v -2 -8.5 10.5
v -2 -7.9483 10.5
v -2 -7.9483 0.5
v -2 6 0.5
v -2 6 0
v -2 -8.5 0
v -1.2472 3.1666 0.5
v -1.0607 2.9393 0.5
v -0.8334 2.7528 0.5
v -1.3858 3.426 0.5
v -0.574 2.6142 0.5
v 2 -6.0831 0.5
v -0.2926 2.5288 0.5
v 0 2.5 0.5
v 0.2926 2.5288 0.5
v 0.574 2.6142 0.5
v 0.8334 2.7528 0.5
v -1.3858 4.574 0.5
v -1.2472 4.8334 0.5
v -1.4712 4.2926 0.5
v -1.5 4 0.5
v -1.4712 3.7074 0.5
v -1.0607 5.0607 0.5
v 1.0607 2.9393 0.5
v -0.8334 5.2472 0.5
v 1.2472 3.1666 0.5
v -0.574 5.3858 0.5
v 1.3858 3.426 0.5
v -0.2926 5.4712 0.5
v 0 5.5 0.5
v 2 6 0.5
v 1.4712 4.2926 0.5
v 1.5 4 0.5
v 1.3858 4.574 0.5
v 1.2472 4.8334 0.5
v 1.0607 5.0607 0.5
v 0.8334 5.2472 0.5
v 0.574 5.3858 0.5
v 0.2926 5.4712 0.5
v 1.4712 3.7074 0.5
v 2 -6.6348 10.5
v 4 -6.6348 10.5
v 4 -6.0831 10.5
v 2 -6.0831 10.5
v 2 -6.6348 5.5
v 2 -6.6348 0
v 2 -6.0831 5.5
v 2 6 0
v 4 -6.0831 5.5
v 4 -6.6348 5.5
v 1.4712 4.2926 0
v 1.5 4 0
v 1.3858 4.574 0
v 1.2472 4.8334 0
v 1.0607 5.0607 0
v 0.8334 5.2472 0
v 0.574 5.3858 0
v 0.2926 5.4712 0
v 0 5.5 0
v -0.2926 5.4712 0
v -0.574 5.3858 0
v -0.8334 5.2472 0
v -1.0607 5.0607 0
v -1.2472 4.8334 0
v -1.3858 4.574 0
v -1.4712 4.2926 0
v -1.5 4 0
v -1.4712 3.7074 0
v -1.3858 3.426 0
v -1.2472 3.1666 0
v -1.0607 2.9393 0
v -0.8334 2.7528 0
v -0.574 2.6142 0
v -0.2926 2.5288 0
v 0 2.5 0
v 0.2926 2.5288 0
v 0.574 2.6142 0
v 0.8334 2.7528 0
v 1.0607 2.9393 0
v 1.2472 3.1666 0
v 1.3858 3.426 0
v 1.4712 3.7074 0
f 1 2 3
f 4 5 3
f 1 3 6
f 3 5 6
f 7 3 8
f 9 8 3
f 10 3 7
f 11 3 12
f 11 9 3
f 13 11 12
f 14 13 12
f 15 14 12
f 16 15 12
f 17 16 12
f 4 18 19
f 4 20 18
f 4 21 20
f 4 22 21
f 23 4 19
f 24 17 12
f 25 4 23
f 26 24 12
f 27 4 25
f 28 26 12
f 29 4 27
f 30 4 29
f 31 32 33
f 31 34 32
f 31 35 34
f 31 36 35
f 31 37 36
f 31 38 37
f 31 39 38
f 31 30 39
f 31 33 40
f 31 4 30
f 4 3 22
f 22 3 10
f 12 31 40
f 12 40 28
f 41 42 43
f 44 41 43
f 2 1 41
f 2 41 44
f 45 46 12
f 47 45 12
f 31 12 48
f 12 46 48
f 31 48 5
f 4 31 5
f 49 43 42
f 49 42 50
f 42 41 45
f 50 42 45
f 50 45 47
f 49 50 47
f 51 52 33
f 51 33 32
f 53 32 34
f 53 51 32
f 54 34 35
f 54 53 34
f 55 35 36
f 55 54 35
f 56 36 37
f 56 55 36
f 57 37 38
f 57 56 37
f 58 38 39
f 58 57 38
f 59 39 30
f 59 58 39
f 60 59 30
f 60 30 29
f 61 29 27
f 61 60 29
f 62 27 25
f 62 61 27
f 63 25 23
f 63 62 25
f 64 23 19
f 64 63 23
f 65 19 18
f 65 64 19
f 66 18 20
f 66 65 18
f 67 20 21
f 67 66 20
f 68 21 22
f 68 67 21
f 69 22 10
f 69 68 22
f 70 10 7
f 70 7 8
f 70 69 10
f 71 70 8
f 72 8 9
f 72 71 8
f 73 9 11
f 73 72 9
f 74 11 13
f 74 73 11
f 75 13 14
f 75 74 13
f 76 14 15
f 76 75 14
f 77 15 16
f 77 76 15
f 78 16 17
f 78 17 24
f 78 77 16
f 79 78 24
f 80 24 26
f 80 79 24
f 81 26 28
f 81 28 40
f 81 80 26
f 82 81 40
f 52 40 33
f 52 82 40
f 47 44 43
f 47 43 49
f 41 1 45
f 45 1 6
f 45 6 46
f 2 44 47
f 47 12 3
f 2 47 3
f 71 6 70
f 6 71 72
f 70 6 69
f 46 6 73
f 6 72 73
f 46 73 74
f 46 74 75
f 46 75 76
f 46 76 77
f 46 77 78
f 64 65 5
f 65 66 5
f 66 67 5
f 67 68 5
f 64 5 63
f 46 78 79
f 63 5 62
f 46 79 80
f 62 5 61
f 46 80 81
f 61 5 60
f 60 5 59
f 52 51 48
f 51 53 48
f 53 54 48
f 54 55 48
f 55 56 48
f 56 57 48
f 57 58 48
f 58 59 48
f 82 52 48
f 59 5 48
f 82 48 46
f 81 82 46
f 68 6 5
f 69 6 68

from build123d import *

# Parameters (mm, degrees)
SKETCH_4_R      = 1.5
EXTRUDE_3_DEPTH = 0.5
EXTRUDE_4_DEPTH = 10
SKETCH_6_W      = 5
SKETCH_6_H      = 0.551688959
EXTRUDE_5_DEPTH = 2


with BuildPart() as part:
    # Эскиз4 → Бобышка-Вытянуть3 (new body)
    with BuildSketch(Plane.XY):
        Polygon((-2, -8.5), (2, -6.634769367), (2, 6), (-2, 6), align=None)
        with Locations((0, 4)):
            Circle(SKETCH_4_R, mode=Mode.SUBTRACT)
    extrude(amount=EXTRUDE_3_DEPTH)

    # Эскиз5 → Бобышка-Вытянуть4 (add)
    with BuildSketch(Plane.XY.offset(0.5)):
        Polygon((-2, -8.5), (2, -6.634769367), (2, -6.083080408), (-2, -7.948311041), align=None)
    extrude(amount=EXTRUDE_4_DEPTH)

    # Эскиз6 → Бобышка-Вытянуть5 (add)
    with BuildSketch(Plane(origin=(2, 0, 0), x_dir=(0, 0, -1), z_dir=(1, 0, 0))):
        with Locations((-8, -6.358924888)):
            Rectangle(SKETCH_6_W, SKETCH_6_H)
    extrude(amount=EXTRUDE_5_DEPTH)


solid = part.part
